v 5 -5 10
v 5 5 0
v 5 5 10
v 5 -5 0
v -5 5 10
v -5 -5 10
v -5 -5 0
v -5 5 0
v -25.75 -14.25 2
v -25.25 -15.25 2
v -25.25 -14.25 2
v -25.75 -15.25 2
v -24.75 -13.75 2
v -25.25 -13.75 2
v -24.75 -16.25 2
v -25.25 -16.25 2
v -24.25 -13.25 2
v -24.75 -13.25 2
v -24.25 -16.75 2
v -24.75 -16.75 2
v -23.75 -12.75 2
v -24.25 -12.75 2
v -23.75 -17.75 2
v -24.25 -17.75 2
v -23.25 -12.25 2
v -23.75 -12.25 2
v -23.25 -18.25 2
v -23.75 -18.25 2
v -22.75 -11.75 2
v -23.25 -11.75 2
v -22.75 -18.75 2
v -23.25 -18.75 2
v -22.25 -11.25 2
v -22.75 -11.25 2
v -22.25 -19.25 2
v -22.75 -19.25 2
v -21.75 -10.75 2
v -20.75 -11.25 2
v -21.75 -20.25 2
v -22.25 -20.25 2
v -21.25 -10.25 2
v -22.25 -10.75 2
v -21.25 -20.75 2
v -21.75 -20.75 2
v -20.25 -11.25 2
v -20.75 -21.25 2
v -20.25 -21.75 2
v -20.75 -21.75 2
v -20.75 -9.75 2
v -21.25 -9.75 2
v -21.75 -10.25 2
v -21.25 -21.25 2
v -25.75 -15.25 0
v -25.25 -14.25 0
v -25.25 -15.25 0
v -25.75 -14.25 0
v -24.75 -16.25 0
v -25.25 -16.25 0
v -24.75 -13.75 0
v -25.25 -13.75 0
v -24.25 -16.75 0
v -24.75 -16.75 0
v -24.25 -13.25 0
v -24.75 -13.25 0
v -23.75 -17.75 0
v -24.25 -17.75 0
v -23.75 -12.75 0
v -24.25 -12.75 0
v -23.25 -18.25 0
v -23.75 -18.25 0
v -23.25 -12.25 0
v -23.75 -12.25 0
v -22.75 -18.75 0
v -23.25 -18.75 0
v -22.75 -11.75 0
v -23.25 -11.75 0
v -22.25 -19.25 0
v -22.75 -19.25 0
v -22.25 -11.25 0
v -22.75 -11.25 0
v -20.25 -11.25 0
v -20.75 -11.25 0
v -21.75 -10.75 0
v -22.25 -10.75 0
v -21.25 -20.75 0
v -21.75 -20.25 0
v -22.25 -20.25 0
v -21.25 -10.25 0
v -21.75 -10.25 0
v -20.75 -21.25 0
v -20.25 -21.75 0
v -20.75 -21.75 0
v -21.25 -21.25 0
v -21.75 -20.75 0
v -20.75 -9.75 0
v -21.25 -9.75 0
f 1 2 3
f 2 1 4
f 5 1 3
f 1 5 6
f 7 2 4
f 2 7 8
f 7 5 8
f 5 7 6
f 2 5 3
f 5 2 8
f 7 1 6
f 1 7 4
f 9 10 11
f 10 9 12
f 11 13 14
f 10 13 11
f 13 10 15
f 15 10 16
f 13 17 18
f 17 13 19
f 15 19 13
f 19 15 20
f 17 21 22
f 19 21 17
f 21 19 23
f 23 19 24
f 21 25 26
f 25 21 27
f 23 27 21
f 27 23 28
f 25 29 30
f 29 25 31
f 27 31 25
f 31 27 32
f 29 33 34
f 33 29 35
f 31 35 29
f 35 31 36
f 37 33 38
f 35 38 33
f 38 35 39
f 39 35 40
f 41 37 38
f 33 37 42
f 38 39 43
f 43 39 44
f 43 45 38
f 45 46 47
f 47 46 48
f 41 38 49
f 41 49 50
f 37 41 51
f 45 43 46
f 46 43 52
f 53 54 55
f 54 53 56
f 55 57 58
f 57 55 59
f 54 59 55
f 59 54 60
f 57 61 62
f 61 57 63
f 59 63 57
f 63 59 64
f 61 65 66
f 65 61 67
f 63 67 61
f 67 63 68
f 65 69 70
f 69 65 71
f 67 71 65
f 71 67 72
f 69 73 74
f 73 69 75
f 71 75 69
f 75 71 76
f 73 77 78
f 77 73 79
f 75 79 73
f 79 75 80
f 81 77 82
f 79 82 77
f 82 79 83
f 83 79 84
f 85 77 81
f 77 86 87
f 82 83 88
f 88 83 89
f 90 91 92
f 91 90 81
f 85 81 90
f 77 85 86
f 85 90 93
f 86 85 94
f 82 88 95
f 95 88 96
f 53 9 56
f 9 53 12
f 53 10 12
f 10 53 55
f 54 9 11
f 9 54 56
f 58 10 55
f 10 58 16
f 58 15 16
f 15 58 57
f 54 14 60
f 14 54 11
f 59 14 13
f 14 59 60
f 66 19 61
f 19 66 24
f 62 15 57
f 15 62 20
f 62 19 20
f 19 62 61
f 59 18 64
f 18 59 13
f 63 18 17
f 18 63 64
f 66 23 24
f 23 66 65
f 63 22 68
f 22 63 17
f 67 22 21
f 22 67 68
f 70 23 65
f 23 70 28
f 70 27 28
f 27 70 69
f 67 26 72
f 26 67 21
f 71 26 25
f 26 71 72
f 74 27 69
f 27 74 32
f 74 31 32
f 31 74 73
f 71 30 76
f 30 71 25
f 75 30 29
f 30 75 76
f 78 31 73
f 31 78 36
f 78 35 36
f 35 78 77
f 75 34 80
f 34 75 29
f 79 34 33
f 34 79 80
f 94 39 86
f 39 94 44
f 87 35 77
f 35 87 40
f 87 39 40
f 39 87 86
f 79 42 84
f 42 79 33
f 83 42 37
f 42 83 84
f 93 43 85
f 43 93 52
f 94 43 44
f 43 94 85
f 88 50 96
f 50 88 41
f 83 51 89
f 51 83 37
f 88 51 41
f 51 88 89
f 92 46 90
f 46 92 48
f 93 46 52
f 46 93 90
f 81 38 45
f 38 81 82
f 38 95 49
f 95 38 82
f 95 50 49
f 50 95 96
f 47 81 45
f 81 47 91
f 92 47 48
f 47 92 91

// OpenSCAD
translate([0, 0, 5]) color([0,1,0,0.9]) cube([10, 10, 10], center=true);
translate([-25.5, -15.0, 1]) color([1,0,0]) cube([0.5, 0.5, 2], center=true);
translate([-25.5, -14.5, 1]) color([1,0,0]) cube([0.5, 0.5, 2], center=true);
translate([-25.0, -16.0, 1]) color([1,0,0]) cube([0.5, 0.5, 2], center=true);
translate([-25.0, -15.5, 1]) color([1,0,0]) cube([0.5, 0.5, 2], center=true);
translate([-25.0, -15.0, 1]) color([1,0,0]) cube([0.5, 0.5, 2], center=true);
translate([-25.0, -14.5, 1]) color([1,0,0]) cube([0.5, 0.5, 2], center=true);
translate([-25.0, -14.0, 1]) color([1,0,0]) cube([0.5, 0.5, 2], center=true);
translate([-24.5, -16.5, 1]) color([1,0,0]) cube([0.5, 0.5, 2], center=true);
translate([-24.5, -16.0, 1]) color([1,0,0]) cube([0.5, 0.5, 2], center=true);
translate([-24.5, -15.5, 1]) color([1,0,0]) cube([0.5, 0.5, 2], center=true);
translate([-24.5, -15.0, 1]) color([1,0,0]) cube([0.5, 0.5, 2], center=true);
translate([-24.5, -14.5, 1]) color([1,0,0]) cube([0.5, 0.5, 2], center=true);
translate([-24.5, -14.0, 1]) color([1,0,0]) cube([0.5, 0.5, 2], center=true);
translate([-24.5, -13.5, 1]) color([1,0,0]) cube([0.5, 0.5, 2], center=true);
translate([-24.0, -17.5, 1]) color([1,0,0]) cube([0.5, 0.5, 2], center=true);
translate([-24.0, -17.0, 1]) color([1,0,0]) cube([0.5, 0.5, 2], center=true);
translate([-24.0, -16.5, 1]) color([1,0,0]) cube([0.5, 0.5, 2], center=true);
translate([-24.0, -16.0, 1]) color([1,0,0]) cube([0.5, 0.5, 2], center=true);
translate([-24.0, -15.5, 1]) color([1,0,0]) cube([0.5, 0.5, 2], center=true);
translate([-24.0, -15.0, 1]) color([1,0,0]) cube([0.5, 0.5, 2], center=true);
translate([-24.0, -14.5, 1]) color([1,0,0]) cube([0.5, 0.5, 2], center=true);
translate([-24.0, -14.0, 1]) color([1,0,0]) cube([0.5, 0.5, 2], center=true);
translate([-24.0, -13.5, 1]) color([1,0,0]) cube([0.5, 0.5, 2], center=true);
translate([-24.0, -13.0, 1]) color([1,0,0]) cube([0.5, 0.5, 2], center=true);
translate([-23.5, -18.0, 1]) color([1,0,0]) cube([0.5, 0.5, 2], center=true);
translate([-23.5, -17.5, 1]) color([1,0,0]) cube([0.5, 0.5, 2], center=true);
translate([-23.5, -17.0, 1]) color([1,0,0]) cube([0.5, 0.5, 2], center=true);
translate([-23.5, -16.5, 1]) color([1,0,0]) cube([0.5, 0.5, 2], center=true);
translate([-23.5, -16.0, 1]) color([1,0,0]) cube([0.5, 0.5, 2], center=true);
translate([-23.5, -15.5, 1]) color([1,0,0]) cube([0.5, 0.5, 2], center=true);
translate([-23.5, -15.0, 1]) color([1,0,0]) cube([0.5, 0.5, 2], center=true);
translate([-23.5, -14.5, 1]) color([1,0,0]) cube([0.5, 0.5, 2], center=true);
translate([-23.5, -14.0, 1]) color([1,0,0]) cube([0.5, 0.5, 2], center=true);
translate([-23.5, -13.5, 1]) color([1,0,0]) cube([0.5, 0.5, 2], center=true);
translate([-23.5, -13.0, 1]) color([1,0,0]) cube([0.5, 0.5, 2], center=true);
translate([-23.5, -12.5, 1]) color([1,0,0]) cube([0.5, 0.5, 2], center=true);
translate([-23.0, -18.5, 1]) color([1,0,0]) cube([0.5, 0.5, 2], center=true);
translate([-23.0, -18.0, 1]) color([1,0,0]) cube([0.5, 0.5, 2], center=true);
translate([-23.0, -17.5, 1]) color([1,0,0]) cube([0.5, 0.5, 2], center=true);
translate([-23.0, -17.0, 1]) color([1,0,0]) cube([0.5, 0.5, 2], center=true);
translate([-23.0, -16.5, 1]) color([1,0,0]) cube([0.5, 0.5, 2], center=true);
translate([-23.0, -16.0, 1]) color([1,0,0]) cube([0.5, 0.5, 2], center=true);
translate([-23.0, -15.5, 1]) color([1,0,0]) cube([0.5, 0.5, 2], center=true);
translate([-23.0, -15.0, 1]) color([1,0,0]) cube([0.5, 0.5, 2], center=true);
translate([-23.0, -14.5, 1]) color([1,0,0]) cube([0.5, 0.5, 2], center=true);
translate([-23.0, -14.0, 1]) color([1,0,0]) cube([0.5, 0.5, 2], center=true);
translate([-23.0, -13.5, 1]) color([1,0,0]) cube([0.5, 0.5, 2], center=true);
translate([-23.0, -13.0, 1]) color([1,0,0]) cube([0.5, 0.5, 2], center=true);
translate([-23.0, -12.5, 1]) color([1,0,0]) cube([0.5, 0.5, 2], center=true);
translate([-23.0, -12.0, 1]) color([1,0,0]) cube([0.5, 0.5, 2], center=true);
translate([-22.5, -19.0, 1]) color([1,0,0]) cube([0.5, 0.5, 2], center=true);
translate([-22.5, -18.5, 1]) color([1,0,0]) cube([0.5, 0.5, 2], center=true);
translate([-22.5, -18.0, 1]) color([1,0,0]) cube([0.5, 0.5, 2], center=true);
translate([-22.5, -17.5, 1]) color([1,0,0]) cube([0.5, 0.5, 2], center=true);
translate([-22.5, -17.0, 1]) color([1,0,0]) cube([0.5, 0.5, 2], center=true);
translate([-22.5, -16.5, 1]) color([1,0,0]) cube([0.5, 0.5, 2], center=true);
translate([-22.5, -16.0, 1]) color([1,0,0]) cube([0.5, 0.5, 2], center=true);
translate([-22.5, -15.5, 1]) color([1,0,0]) cube([0.5, 0.5, 2], center=true);
translate([-22.5, -15.0, 1]) color([1,0,0]) cube([0.5, 0.5, 2], center=true);
translate([-22.5, -14.5, 1]) color([1,0,0]) cube([0.5, 0.5, 2], center=true);
translate([-22.5, -14.0, 1]) color([1,0,0]) cube([0.5, 0.5, 2], center=true);
translate([-22.5, -13.5, 1]) color([1,0,0]) cube([0.5, 0.5, 2], center=true);
translate([-22.5, -13.0, 1]) color([1,0,0]) cube([0.5, 0.5, 2], center=true);
translate([-22.5, -12.5, 1]) color([1,0,0]) cube([0.5, 0.5, 2], center=true);
translate([-22.5, -12.0, 1]) color([1,0,0]) cube([0.5, 0.5, 2], center=true);
translate([-22.5, -11.5, 1]) color([1,0,0]) cube([0.5, 0.5, 2], center=true);
translate([-22.0, -20.0, 1]) color([1,0,0]) cube([0.5, 0.5, 2], center=true);
translate([-22.0, -19.5, 1]) color([1,0,0]) cube([0.5, 0.5, 2], center=true);
translate([-22.0, -19.0, 1]) color([1,0,0]) cube([0.5, 0.5, 2], center=true);
translate([-22.0, -18.5, 1]) color([1,0,0]) cube([0.5, 0.5, 2], center=true);
translate([-22.0, -18.0, 1]) color([1,0,0]) cube([0.5, 0.5, 2], center=true);
translate([-22.0, -17.5, 1]) color([1,0,0]) cube([0.5, 0.5, 2], center=true);
translate([-22.0, -17.0, 1]) color([1,0,0]) cube([0.5, 0.5, 2], center=true);
translate([-22.0, -16.5, 1]) color([1,0,0]) cube([0.5, 0.5, 2], center=true);
translate([-22.0, -16.0, 1]) color([1,0,0]) cube([0.5, 0.5, 2], center=true);
translate([-22.0, -15.5, 1]) color([1,0,0]) cube([0.5, 0.5, 2], center=true);
translate([-22.0, -15.0, 1]) color([1,0,0]) cube([0.5, 0.5, 2], center=true);
translate([-22.0, -14.5, 1]) color([1,0,0]) cube([0.5, 0.5, 2], center=true);
translate([-22.0, -14.0, 1]) color([1,0,0]) cube([0.5, 0.5, 2], center=true);
translate([-22.0, -13.5, 1]) color([1,0,0]) cube([0.5, 0.5, 2], center=true);
translate([-22.0, -13.0, 1]) color([1,0,0]) cube([0.5, 0.5, 2], center=true);
translate([-22.0, -12.5, 1]) color([1,0,0]) cube([0.5, 0.5, 2], center=true);
translate([-22.0, -12.0, 1]) color([1,0,0]) cube([0.5, 0.5, 2], center=true);
translate([-22.0, -11.5, 1]) color([1,0,0]) cube([0.5, 0.5, 2], center=true);
translate([-22.0, -11.0, 1]) color([1,0,0]) cube([0.5, 0.5, 2], center=true);
translate([-21.5, -20.5, 1]) color([1,0,0]) cube([0.5, 0.5, 2], center=true);
translate([-21.5, -20.0, 1]) color([1,0,0]) cube([0.5, 0.5, 2], center=true);
translate([-21.5, -19.5, 1]) color([1,0,0]) cube([0.5, 0.5, 2], center=true);
translate([-21.5, -19.0, 1]) color([1,0,0]) cube([0.5, 0.5, 2], center=true);
translate([-21.5, -18.5, 1]) color([1,0,0]) cube([0.5, 0.5, 2], center=true);
translate([-21.5, -18.0, 1]) color([1,0,0]) cube([0.5, 0.5, 2], center=true);
translate([-21.5, -17.5, 1]) color([1,0,0]) cube([0.5, 0.5, 2], center=true);
translate([-21.5, -17.0, 1]) color([1,0,0]) cube([0.5, 0.5, 2], center=true);
translate([-21.5, -16.5, 1]) color([1,0,0]) cube([0.5, 0.5, 2], center=true);
translate([-21.5, -16.0, 1]) color([1,0,0]) cube([0.5, 0.5, 2], center=true);
translate([-21.5, -15.5, 1]) color([1,0,0]) cube([0.5, 0.5, 2], center=true);
translate([-21.5, -15.0, 1]) color([1,0,0]) cube([0.5, 0.5, 2], center=true);
translate([-21.5, -14.5, 1]) color([1,0,0]) cube([0.5, 0.5, 2], center=true);
translate([-21.5, -14.0, 1]) color([1,0,0]) cube([0.5, 0.5, 2], center=true);
translate([-21.5, -13.5, 1]) color([1,0,0]) cube([0.5, 0.5, 2], center=true);
translate([-21.5, -13.0, 1]) color([1,0,0]) cube([0.5, 0.5, 2], center=true);
translate([-21.5, -12.5, 1]) color([1,0,0]) cube([0.5, 0.5, 2], center=true);
translate([-21.5, -12.0, 1]) color([1,0,0]) cube([0.5, 0.5, 2], center=true);
translate([-21.5, -11.5, 1]) color([1,0,0]) cube([0.5, 0.5, 2], center=true);
translate([-21.5, -11.0, 1]) color([1,0,0]) cube([0.5, 0.5, 2], center=true);
translate([-21.5, -10.5, 1]) color([1,0,0]) cube([0.5, 0.5, 2], center=true);
translate([-21.0, -21.0, 1]) color([1,0,0]) cube([0.5, 0.5, 2], center=true);
translate([-21.0, -20.5, 1]) color([1,0,0]) cube([0.5, 0.5, 2], center=true);
translate([-21.0, -20.0, 1]) color([1,0,0]) cube([0.5, 0.5, 2], center=true);
translate([-21.0, -19.5, 1]) color([1,0,0]) cube([0.5, 0.5, 2], center=true);
translate([-21.0, -19.0, 1]) color([1,0,0]) cube([0.5, 0.5, 2], center=true);
translate([-21.0, -18.5, 1]) color([1,0,0]) cube([0.5, 0.5, 2], center=true);
translate([-21.0, -18.0, 1]) color([1,0,0]) cube([0.5, 0.5, 2], center=true);
translate([-21.0, -17.5, 1]) color([1,0,0]) cube([0.5, 0.5, 2], center=true);
translate([-21.0, -17.0, 1]) color([1,0,0]) cube([0.5, 0.5, 2], center=true);
translate([-21.0, -16.5, 1]) color([1,0,0]) cube([0.5, 0.5, 2], center=true);
translate([-21.0, -16.0, 1]) color([1,0,0]) cube([0.5, 0.5, 2], center=true);
translate([-21.0, -15.5, 1]) color([1,0,0]) cube([0.5, 0.5, 2], center=true);
translate([-21.0, -15.0, 1]) color([1,0,0]) cube([0.5, 0.5, 2], center=true);
translate([-21.0, -14.5, 1]) color([1,0,0]) cube([0.5, 0.5, 2], center=true);
translate([-21.0, -14.0, 1]) color([1,0,0]) cube([0.5, 0.5, 2], center=true);
translate([-21.0, -13.5, 1]) color([1,0,0]) cube([0.5, 0.5, 2], center=true);
translate([-21.0, -13.0, 1]) color([1,0,0]) cube([0.5, 0.5, 2], center=true);
translate([-21.0, -12.5, 1]) color([1,0,0]) cube([0.5, 0.5, 2], center=true);
translate([-21.0, -12.0, 1]) color([1,0,0]) cube([0.5, 0.5, 2], center=true);
translate([-21.0, -11.5, 1]) color([1,0,0]) cube([0.5, 0.5, 2], center=true);
translate([-21.0, -11.0, 1]) color([1,0,0]) cube([0.5, 0.5, 2], center=true);
translate([-21.0, -10.5, 1]) color([1,0,0]) cube([0.5, 0.5, 2], center=true);
translate([-21.0, -10.0, 1]) color([1,0,0]) cube([0.5, 0.5, 2], center=true);
translate([-20.5, -21.5, 1]) color([1,0,0]) cube([0.5, 0.5, 2], center=true);
translate([-20.5, -21.0, 1]) color([1,0,0]) cube([0.5, 0.5, 2], center=true);
translate([-20.5, -20.5, 1]) color([1,0,0]) cube([0.5, 0.5, 2], center=true);
translate([-20.5, -20.0, 1]) color([1,0,0]) cube([0.5, 0.5, 2], center=true);
translate([-20.5, -19.5, 1]) color([1,0,0]) cube([0.5, 0.5, 2], center=true);
translate([-20.5, -19.0, 1]) color([1,0,0]) cube([0.5, 0.5, 2], center=true);
translate([-20.5, -18.5, 1]) color([1,0,0]) cube([0.5, 0.5, 2], center=true);
translate([-20.5, -18.0, 1]) color([1,0,0]) cube([0.5, 0.5, 2], center=true);
translate([-20.5, -17.5, 1]) color([1,0,0]) cube([0.5, 0.5, 2], center=true);
translate([-20.5, -17.0, 1]) color([1,0,0]) cube([0.5, 0.5, 2], center=true);
translate([-20.5, -16.5, 1]) color([1,0,0]) cube([0.5, 0.5, 2], center=true);
translate([-20.5, -16.0, 1]) color([1,0,0]) cube([0.5, 0.5, 2], center=true);
translate([-20.5, -15.5, 1]) color([1,0,0]) cube([0.5, 0.5, 2], center=true);
translate([-20.5, -15.0, 1]) color([1,0,0]) cube([0.5, 0.5, 2], center=true);
translate([-20.5, -14.5, 1]) color([1,0,0]) cube([0.5, 0.5, 2], center=true);
translate([-20.5, -14.0, 1]) color([1,0,0]) cube([0.5, 0.5, 2], center=true);
translate([-20.5, -13.5, 1]) color([1,0,0]) cube([0.5, 0.5, 2], center=true);
translate([-20.5, -13.0, 1]) color([1,0,0]) cube([0.5, 0.5, 2], center=true);
translate([-20.5, -12.5, 1]) color([1,0,0]) cube([0.5, 0.5, 2], center=true);
translate([-20.5, -12.0, 1]) color([1,0,0]) cube([0.5, 0.5, 2], center=true);
translate([-20.5, -11.5, 1]) color([1,0,0]) cube([0.5, 0.5, 2], center=true);
